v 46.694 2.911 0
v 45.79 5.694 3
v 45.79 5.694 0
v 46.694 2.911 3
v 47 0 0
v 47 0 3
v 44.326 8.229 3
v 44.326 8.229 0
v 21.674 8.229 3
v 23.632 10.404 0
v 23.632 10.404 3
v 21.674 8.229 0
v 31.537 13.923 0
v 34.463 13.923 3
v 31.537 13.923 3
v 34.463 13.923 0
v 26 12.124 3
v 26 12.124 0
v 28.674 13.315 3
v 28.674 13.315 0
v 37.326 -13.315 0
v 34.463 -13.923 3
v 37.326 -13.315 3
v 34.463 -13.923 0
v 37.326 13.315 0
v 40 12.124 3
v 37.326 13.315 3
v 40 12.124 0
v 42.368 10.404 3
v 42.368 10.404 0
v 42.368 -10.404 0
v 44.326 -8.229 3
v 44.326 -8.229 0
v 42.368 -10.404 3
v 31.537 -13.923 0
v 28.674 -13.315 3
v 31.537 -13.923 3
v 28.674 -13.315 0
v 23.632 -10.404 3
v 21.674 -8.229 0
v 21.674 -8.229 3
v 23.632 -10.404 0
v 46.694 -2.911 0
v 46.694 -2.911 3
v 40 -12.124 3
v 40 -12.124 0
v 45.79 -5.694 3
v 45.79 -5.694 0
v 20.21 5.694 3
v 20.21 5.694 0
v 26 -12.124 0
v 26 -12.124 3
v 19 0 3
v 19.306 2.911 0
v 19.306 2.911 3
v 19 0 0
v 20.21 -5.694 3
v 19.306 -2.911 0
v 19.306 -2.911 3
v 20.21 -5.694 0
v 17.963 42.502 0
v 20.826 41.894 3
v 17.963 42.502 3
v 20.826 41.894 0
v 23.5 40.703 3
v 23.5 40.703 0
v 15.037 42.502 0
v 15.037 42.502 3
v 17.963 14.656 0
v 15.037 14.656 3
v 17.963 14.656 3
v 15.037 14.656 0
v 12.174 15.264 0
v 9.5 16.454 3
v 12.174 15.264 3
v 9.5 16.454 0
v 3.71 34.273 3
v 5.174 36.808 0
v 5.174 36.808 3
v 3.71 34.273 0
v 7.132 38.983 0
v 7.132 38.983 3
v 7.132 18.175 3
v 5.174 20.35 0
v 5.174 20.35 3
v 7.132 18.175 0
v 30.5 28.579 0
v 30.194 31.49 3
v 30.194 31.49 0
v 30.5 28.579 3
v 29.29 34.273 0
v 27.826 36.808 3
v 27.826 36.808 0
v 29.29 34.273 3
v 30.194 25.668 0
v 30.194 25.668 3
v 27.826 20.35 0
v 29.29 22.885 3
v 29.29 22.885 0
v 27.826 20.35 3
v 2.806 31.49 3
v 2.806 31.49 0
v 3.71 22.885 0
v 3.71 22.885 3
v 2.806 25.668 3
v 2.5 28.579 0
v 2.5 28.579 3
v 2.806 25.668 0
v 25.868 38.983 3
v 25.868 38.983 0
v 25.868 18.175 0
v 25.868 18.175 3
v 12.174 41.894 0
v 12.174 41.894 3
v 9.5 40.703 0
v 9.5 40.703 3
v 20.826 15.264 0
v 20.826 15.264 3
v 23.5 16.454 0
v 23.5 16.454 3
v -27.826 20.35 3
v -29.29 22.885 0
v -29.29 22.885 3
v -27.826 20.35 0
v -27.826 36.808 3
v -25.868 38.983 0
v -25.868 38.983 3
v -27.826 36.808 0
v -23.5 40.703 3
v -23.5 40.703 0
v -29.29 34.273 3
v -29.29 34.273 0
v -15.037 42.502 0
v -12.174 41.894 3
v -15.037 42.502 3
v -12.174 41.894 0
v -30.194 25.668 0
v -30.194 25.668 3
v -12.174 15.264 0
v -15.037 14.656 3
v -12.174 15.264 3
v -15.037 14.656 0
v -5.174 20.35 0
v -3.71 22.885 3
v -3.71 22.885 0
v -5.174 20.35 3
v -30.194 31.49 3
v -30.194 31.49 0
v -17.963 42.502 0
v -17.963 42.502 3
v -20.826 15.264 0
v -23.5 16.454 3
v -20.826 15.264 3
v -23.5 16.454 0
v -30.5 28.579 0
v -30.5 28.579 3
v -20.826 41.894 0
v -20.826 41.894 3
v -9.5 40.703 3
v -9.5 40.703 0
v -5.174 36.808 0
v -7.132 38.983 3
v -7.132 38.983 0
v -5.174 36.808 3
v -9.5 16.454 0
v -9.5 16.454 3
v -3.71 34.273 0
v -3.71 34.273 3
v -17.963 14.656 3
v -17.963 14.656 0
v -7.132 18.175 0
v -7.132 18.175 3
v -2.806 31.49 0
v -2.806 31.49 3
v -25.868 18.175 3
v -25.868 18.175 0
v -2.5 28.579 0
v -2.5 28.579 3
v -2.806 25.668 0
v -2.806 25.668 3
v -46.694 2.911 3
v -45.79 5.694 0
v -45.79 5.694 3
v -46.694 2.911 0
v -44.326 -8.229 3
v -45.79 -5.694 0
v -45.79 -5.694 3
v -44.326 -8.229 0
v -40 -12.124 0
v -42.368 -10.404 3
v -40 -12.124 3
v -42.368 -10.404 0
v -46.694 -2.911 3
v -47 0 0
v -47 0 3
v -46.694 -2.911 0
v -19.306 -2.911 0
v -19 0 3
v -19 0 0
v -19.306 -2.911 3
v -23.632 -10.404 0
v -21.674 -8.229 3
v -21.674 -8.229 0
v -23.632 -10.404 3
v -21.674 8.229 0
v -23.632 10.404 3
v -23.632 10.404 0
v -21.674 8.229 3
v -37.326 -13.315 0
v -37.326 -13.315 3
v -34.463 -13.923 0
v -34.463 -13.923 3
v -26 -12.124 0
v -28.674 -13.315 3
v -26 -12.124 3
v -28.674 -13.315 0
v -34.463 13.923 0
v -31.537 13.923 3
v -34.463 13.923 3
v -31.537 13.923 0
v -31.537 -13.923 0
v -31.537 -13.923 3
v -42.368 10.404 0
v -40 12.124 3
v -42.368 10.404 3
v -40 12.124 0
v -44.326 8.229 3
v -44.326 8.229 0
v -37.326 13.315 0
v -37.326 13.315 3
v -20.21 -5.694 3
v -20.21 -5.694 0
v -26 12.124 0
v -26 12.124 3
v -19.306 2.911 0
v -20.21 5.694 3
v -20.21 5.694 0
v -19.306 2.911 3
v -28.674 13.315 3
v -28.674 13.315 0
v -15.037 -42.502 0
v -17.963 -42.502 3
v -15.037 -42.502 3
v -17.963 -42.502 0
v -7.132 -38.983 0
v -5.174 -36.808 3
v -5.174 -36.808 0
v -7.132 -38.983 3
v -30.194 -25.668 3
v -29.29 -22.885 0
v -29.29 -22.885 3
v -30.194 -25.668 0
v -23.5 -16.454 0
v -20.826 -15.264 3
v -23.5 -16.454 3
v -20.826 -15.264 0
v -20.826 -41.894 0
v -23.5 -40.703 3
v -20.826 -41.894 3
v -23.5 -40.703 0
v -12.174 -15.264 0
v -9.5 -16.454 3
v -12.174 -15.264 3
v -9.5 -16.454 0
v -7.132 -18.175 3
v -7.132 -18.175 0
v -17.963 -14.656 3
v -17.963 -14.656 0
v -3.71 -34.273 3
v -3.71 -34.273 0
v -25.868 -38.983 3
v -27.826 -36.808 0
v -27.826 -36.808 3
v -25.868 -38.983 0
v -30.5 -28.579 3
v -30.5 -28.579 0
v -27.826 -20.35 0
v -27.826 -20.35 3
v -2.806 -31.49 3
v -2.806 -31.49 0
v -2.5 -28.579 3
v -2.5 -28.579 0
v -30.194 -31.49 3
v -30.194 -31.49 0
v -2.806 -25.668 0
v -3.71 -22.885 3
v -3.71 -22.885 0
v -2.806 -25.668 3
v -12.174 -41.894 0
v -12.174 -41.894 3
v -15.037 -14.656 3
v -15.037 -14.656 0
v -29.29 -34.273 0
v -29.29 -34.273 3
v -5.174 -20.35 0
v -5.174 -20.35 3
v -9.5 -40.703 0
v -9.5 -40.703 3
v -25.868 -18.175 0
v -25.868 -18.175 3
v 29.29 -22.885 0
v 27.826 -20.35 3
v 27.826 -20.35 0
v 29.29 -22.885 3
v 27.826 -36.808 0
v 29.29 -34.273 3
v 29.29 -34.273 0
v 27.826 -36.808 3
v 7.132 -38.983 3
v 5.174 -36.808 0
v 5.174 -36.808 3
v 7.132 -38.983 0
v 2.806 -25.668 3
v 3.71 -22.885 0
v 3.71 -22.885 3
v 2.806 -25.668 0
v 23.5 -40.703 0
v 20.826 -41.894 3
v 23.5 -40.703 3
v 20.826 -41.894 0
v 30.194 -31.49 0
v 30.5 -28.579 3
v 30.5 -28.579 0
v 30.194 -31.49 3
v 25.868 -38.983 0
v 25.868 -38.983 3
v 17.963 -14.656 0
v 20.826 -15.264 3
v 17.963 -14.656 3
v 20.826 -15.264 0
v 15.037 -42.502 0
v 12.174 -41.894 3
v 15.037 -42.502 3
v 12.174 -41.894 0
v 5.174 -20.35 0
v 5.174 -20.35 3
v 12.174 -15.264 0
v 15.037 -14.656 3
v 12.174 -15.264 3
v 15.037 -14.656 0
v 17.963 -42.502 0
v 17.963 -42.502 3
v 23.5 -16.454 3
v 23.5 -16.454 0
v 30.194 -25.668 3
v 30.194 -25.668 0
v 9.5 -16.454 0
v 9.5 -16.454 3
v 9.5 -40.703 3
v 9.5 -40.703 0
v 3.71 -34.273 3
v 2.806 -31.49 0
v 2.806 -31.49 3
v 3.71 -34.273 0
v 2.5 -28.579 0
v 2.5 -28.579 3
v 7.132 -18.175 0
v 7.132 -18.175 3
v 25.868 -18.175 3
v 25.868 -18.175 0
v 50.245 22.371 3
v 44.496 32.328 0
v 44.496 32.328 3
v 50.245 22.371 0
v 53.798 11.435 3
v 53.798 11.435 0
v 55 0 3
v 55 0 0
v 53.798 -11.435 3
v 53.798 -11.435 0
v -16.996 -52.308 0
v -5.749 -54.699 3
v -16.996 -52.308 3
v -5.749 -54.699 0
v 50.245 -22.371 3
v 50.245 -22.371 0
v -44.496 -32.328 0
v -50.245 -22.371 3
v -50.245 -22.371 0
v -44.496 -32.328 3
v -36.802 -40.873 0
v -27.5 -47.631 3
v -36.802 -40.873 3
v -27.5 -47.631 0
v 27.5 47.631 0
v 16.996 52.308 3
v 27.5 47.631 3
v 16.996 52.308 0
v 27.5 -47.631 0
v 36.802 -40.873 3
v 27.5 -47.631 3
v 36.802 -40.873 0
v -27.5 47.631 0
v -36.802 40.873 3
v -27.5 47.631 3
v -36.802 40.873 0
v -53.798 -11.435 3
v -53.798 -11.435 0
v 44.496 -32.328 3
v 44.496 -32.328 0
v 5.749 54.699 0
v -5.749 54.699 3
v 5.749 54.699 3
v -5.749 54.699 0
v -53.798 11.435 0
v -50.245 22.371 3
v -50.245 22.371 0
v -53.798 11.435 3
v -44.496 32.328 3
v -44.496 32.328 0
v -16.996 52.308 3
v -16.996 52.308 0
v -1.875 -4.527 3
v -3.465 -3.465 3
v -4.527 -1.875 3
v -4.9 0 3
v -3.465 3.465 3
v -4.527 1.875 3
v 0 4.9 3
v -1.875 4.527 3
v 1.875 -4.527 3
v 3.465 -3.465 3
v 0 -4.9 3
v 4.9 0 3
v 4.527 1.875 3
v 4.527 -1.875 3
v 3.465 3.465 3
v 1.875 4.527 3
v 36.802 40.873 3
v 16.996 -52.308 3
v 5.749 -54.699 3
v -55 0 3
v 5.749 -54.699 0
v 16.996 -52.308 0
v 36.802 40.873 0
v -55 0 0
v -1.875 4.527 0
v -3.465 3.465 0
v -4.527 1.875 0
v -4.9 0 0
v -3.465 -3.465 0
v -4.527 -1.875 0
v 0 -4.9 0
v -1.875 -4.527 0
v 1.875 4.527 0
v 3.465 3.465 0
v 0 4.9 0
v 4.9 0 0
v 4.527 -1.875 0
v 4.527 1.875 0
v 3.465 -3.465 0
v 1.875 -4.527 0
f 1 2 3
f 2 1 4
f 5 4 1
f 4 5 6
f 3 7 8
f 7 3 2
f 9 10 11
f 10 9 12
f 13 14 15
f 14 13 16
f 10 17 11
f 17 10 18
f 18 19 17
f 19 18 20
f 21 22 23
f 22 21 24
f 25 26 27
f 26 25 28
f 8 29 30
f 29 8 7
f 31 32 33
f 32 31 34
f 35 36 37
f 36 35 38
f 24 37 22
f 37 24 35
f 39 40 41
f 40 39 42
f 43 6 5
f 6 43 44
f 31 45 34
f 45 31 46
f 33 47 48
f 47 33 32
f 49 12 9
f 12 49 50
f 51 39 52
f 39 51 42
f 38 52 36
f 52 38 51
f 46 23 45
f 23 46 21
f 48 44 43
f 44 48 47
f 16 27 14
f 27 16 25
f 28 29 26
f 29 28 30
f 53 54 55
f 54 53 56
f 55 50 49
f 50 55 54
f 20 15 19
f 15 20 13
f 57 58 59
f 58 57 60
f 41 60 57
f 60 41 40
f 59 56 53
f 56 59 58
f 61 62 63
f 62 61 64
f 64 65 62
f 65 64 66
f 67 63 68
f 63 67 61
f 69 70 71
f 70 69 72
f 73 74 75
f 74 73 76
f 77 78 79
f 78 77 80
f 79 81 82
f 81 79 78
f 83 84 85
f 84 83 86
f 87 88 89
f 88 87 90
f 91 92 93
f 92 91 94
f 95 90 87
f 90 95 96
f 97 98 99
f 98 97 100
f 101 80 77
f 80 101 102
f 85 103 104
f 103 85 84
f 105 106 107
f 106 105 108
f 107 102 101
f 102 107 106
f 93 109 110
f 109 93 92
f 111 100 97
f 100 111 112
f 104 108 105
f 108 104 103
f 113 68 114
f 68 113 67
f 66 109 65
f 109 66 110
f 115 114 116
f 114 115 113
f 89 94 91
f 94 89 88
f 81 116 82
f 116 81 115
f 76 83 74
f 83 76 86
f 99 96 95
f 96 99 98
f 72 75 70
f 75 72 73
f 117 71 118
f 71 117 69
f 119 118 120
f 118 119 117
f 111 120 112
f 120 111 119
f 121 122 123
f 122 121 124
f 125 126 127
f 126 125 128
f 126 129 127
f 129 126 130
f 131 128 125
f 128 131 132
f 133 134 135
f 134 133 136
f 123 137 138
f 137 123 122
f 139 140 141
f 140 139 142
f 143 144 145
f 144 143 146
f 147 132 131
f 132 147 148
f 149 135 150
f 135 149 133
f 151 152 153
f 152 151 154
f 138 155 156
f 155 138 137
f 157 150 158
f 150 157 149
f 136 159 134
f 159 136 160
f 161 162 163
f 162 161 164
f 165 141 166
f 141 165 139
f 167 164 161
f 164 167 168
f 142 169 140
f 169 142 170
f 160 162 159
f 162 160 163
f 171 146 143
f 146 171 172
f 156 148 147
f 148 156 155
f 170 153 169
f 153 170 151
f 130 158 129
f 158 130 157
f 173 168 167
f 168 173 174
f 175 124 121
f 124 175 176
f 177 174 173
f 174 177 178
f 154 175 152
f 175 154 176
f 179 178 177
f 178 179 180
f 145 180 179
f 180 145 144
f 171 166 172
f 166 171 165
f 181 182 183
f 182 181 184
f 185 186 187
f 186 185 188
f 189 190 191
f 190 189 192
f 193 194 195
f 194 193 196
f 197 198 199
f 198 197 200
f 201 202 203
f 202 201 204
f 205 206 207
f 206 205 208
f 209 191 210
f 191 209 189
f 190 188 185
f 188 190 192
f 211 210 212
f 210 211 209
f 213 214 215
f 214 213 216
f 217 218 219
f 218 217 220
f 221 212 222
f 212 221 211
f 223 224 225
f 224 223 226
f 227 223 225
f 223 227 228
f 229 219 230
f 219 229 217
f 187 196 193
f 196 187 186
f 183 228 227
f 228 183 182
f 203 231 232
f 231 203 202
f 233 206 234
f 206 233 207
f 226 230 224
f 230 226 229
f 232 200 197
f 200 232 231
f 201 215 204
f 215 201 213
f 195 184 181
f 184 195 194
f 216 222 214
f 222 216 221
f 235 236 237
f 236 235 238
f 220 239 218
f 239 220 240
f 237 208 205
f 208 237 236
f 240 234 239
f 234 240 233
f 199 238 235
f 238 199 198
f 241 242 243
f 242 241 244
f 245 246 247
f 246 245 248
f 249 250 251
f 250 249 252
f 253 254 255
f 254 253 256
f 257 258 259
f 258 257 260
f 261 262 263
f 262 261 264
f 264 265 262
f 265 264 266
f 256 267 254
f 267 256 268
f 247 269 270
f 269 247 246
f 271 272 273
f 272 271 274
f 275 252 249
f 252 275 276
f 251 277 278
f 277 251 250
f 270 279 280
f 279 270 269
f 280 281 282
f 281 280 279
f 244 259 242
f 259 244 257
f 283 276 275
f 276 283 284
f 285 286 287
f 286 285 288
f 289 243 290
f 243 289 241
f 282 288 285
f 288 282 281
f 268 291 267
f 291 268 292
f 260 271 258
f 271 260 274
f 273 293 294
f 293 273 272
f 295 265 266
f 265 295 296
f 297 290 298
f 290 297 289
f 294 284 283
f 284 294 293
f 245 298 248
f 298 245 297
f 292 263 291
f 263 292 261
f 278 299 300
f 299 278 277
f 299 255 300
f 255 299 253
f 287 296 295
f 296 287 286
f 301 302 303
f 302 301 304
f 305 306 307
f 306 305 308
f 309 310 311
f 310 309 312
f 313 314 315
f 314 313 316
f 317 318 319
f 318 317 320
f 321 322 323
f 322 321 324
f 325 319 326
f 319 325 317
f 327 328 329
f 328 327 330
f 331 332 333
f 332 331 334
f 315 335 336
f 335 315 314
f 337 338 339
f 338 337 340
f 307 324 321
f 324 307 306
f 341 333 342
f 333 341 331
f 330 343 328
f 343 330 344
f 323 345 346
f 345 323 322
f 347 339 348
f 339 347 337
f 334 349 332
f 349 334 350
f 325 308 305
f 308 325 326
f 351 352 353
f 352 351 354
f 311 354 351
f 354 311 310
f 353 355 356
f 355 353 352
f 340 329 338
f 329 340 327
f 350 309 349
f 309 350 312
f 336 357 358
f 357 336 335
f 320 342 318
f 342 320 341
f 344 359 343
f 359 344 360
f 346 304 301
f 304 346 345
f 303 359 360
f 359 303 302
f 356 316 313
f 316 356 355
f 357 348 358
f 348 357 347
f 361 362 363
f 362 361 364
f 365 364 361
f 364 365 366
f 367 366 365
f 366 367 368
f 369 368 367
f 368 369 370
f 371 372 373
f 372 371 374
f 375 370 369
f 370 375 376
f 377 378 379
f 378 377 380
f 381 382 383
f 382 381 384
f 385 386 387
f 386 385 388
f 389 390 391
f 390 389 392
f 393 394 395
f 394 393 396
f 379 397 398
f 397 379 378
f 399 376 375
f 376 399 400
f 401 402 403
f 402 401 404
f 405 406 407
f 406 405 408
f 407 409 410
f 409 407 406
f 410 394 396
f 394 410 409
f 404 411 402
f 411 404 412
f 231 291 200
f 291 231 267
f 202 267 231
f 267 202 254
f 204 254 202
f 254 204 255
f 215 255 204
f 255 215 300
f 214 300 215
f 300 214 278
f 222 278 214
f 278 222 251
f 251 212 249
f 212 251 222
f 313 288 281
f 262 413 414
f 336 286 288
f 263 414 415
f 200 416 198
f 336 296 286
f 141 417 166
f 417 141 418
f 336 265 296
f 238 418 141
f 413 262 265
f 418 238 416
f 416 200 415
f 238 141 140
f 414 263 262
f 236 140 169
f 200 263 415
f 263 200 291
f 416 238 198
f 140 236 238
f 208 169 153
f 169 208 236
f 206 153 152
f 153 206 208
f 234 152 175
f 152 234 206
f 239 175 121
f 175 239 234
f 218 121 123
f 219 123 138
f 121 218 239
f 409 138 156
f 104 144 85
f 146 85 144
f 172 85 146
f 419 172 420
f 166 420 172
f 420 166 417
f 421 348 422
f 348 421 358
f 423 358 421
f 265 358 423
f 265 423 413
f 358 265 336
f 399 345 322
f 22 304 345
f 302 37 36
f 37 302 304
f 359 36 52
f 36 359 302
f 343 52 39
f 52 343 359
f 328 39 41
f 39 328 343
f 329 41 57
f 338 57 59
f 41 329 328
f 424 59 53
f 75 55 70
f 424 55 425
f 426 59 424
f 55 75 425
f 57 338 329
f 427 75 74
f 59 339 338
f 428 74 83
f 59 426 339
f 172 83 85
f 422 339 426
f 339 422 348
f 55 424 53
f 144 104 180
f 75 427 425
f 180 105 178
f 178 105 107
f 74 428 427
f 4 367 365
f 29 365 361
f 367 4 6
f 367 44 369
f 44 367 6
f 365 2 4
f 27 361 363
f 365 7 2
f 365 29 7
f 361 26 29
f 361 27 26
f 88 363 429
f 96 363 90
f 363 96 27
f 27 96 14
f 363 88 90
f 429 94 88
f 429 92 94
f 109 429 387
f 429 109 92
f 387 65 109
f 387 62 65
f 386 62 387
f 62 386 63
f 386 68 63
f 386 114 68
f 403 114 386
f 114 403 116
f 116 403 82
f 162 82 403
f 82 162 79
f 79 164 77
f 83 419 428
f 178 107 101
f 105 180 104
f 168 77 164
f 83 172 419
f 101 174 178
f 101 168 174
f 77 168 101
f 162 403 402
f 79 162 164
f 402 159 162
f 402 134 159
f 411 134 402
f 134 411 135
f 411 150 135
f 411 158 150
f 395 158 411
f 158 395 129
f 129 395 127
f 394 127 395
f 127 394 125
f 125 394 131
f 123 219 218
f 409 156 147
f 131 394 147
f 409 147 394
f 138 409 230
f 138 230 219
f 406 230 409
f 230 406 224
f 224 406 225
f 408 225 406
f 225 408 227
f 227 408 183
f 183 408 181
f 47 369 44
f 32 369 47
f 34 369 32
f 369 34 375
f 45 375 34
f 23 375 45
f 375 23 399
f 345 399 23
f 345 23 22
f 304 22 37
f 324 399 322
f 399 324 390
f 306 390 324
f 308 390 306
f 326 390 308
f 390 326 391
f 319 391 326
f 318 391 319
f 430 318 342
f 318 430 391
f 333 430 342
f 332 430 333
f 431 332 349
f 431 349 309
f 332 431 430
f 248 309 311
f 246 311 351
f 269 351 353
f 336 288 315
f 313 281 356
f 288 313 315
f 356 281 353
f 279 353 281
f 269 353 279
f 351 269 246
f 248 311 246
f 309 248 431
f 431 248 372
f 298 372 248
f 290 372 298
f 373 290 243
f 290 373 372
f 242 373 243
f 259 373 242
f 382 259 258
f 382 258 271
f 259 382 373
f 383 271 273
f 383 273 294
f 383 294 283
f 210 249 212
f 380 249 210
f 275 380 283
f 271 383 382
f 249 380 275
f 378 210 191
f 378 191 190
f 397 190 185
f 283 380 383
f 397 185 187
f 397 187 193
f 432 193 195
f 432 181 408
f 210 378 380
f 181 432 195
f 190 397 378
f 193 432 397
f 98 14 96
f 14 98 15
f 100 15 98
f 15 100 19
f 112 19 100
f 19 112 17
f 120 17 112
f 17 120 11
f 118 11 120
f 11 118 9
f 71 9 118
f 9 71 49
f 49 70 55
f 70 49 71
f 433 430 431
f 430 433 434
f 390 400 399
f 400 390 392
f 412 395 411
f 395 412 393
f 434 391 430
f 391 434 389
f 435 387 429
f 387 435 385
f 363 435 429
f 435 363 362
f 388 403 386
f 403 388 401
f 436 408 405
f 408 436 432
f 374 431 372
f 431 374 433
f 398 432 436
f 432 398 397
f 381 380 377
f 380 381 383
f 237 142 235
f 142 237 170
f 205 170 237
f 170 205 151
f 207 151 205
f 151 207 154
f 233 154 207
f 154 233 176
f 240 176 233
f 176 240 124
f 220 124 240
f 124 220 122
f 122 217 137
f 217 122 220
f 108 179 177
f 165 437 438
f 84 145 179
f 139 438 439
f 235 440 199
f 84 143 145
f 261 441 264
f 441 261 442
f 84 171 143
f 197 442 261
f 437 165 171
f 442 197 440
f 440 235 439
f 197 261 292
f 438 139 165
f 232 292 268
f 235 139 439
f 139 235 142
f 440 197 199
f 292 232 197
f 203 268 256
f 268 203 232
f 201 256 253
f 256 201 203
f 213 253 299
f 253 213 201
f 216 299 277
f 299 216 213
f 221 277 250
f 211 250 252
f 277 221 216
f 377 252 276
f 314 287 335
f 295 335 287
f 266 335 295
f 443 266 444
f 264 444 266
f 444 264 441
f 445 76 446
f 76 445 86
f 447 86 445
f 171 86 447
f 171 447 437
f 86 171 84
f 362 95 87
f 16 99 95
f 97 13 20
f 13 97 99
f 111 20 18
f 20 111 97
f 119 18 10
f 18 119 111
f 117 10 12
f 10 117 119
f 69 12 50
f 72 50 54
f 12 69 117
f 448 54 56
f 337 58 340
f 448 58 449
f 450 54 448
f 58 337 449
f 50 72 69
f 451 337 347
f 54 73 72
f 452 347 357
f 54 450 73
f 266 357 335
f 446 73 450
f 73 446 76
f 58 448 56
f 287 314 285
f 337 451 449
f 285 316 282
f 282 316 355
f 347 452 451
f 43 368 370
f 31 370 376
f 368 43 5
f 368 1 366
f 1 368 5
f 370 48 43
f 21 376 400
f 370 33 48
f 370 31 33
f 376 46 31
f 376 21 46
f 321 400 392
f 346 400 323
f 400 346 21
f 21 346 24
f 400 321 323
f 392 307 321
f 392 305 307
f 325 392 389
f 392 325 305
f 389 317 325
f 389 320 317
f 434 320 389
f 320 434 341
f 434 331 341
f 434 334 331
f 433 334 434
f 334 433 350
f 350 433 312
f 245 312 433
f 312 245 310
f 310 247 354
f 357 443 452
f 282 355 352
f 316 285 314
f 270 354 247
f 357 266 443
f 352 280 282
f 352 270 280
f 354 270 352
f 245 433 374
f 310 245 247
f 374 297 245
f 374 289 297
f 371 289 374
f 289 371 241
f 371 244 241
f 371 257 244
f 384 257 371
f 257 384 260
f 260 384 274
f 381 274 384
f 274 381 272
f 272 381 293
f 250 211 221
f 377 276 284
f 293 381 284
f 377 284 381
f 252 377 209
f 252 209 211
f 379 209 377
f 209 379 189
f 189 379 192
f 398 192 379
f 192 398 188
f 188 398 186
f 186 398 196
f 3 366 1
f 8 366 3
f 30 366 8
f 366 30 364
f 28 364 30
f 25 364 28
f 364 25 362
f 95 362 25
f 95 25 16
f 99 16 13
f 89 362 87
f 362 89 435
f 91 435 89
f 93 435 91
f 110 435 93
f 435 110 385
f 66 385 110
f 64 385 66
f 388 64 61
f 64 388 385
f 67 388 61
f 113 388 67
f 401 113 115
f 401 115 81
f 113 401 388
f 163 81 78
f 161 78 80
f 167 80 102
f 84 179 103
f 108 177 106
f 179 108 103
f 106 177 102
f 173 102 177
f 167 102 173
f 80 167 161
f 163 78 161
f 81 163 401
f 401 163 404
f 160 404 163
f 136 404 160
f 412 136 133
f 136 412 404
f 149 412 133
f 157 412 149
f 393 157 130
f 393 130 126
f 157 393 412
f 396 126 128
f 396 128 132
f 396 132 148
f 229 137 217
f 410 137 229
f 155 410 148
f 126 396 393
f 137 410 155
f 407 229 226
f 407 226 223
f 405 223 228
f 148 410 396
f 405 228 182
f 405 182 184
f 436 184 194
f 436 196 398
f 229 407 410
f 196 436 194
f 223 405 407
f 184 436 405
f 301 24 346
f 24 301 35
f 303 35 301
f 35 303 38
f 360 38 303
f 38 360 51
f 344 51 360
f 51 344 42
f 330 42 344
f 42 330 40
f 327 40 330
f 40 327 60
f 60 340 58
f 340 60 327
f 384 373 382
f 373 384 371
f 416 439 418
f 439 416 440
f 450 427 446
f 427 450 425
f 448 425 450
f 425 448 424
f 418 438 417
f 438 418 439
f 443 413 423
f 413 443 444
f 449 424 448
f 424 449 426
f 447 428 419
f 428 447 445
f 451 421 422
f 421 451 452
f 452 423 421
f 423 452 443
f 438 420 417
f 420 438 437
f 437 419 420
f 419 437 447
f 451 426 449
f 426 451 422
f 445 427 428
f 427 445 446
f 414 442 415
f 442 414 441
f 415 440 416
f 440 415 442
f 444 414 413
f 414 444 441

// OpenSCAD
tickerTapeW = 13.5;
tickerTapeHubR = 11.5/2;

tickerTapeFlangeT = 3;
tickerTapeFlangeR = 110/2;
tickerTapeFlangeReliefR = 5;
tickerTapeScrewR = 4.1/2;
tickerTapeCutR = 14;


printGuideHoleSpacing = 42;
printGuideLength = 68;
printGuideT = 4;
printGuideFlangeH = 2;
printRollerR = 5.5/2;
printIdlerR = 9.8/2;
printIdlerRollerSpacing = 33;
printHeadWidth = 24;


mTapeHolderBody();
translate([0,0,tickerTapeFlangeT+tickerTapeW])
	mTapeHolderWasher();
mPrintGuide();
!mTapeHolderWasherNEW();
mTapeHolderWasherNEW2();

//mCountersink(7.6/2,tickerTapeScrewR,10);

module mTapeHolderWasherNEW(){
	difference(){
		cylinder(r=tickerTapeFlangeR, h = tickerTapeFlangeT);
		cylinder(r=printIdlerR, h = 4*tickerTapeW,center=true);
		mTapeHolderCuts();
	}
}

module mTapeHolderWasherNEW2(){
	difference(){
		union(){
			cylinder(r=tickerTapeFlangeR, h = tickerTapeFlangeT);
			cylinder(r=2*printIdlerR, h = 2*12.6-tickerTapeFlangeT-tickerTapeW);
		}
		cylinder(r=printIdlerR, h = 4*tickerTapeW,center=true);
		mTapeHolderCuts();
	}
}


module mTapeHolderBody(){
	difference(){
		union(){
			cylinder(r=tickerTapeFlangeR, h = tickerTapeFlangeT);
			translate([0,0,tickerTapeFlangeT])
				cylinder(r=tickerTapeHubR, h = tickerTapeW);
		}
		cylinder(r=tickerTapeFlangeReliefR, h = 2*tickerTapeFlangeT,center=true);
		translate([0,0,tickerTapeFlangeT+0.5])
			cylinder(r=tickerTapeScrewR, h = 2*tickerTapeW);
		mTapeHolderCuts();
	}
}

module mTapeHolderWasher(){
	difference(){
		cylinder(r=tickerTapeFlangeR, h = tickerTapeFlangeT);
		cylinder(r=tickerTapeScrewR, h = 4*tickerTapeW,center=true);
		mTapeHolderCuts();
	}
}

module mTapeHolderCuts(){
	for(i=[0:6]){
		rotate([0,0,360/6*i])translate([3*tickerTapeFlangeR/5,0,0])
		cylinder(r=tickerTapeCutR, h = 4*tickerTapeW,center=true);
	}
}

module mPrintGuide(){
	difference(){
		union(){
			difference(){
				translate([0,0,printGuideT/2])
					cube([tickerTapeW,printGuideLength,printGuideT],center=true);
				translate([0,-printGuideLength/2,printGuideT])rotate([30,0,0])
					cube([tickerTapeW,printGuideLength,printGuideT],center=true);
			}
			difference(){
				for(i=[-1,1]){
					translate([i*(tickerTapeFlangeT+tickerTapeW)/2,0,(printGuideT+printGuideFlangeH)/2])
						cube([tickerTapeFlangeT,printGuideLength,printGuideT+printGuideFlangeH],center=true);
				}

				translate([0,printIdlerR-printGuideLength/2+printIdlerRollerSpacing,printGuideT+printRollerR-0.1])rotate([0,90,0])
					cylinder(r=printRollerR, h = tickerTapeW+2*tickerTapeFlangeT+2,center =true,$fn=20);
				translate([-(tickerTapeFlangeT+tickerTapeW)/2,printIdlerR-printGuideLength/2+printIdlerRollerSpacing-printHeadWidth/2,printGuideT+10/2])
					cube([tickerTapeFlangeT+0.1,printHeadWidth,10],center=true);
				translate([0,printIdlerR-printGuideLength/2,printGuideT+printIdlerR-0.1])rotate([0,90,0])
					cylinder(r=printIdlerR, h = tickerTapeW+2*tickerTapeFlangeT+2,center =true,$fn=20);
			}
		}
		for(i=[-1,1]){
			translate([0,i*printGuideHoleSpacing/2,printGuideT])
				mCountersink(7.6/2,tickerTapeScrewR,10);
		}

	}
}

module mCountersink(headRadius, holeRadius, holeDepth,csAngle = 82){
	union(){
		translate([0,0,-0.1])
		cylinder(r=headRadius, h = holeDepth,$fn=20);
		rotate([180,0,0]){
			cylinder(r1=headRadius, r2 = 0, h = tan(csAngle/2)*headRadius,$fn=20);
			cylinder(r=holeRadius, h = holeDepth,$fn=20);
		}
	}

}
